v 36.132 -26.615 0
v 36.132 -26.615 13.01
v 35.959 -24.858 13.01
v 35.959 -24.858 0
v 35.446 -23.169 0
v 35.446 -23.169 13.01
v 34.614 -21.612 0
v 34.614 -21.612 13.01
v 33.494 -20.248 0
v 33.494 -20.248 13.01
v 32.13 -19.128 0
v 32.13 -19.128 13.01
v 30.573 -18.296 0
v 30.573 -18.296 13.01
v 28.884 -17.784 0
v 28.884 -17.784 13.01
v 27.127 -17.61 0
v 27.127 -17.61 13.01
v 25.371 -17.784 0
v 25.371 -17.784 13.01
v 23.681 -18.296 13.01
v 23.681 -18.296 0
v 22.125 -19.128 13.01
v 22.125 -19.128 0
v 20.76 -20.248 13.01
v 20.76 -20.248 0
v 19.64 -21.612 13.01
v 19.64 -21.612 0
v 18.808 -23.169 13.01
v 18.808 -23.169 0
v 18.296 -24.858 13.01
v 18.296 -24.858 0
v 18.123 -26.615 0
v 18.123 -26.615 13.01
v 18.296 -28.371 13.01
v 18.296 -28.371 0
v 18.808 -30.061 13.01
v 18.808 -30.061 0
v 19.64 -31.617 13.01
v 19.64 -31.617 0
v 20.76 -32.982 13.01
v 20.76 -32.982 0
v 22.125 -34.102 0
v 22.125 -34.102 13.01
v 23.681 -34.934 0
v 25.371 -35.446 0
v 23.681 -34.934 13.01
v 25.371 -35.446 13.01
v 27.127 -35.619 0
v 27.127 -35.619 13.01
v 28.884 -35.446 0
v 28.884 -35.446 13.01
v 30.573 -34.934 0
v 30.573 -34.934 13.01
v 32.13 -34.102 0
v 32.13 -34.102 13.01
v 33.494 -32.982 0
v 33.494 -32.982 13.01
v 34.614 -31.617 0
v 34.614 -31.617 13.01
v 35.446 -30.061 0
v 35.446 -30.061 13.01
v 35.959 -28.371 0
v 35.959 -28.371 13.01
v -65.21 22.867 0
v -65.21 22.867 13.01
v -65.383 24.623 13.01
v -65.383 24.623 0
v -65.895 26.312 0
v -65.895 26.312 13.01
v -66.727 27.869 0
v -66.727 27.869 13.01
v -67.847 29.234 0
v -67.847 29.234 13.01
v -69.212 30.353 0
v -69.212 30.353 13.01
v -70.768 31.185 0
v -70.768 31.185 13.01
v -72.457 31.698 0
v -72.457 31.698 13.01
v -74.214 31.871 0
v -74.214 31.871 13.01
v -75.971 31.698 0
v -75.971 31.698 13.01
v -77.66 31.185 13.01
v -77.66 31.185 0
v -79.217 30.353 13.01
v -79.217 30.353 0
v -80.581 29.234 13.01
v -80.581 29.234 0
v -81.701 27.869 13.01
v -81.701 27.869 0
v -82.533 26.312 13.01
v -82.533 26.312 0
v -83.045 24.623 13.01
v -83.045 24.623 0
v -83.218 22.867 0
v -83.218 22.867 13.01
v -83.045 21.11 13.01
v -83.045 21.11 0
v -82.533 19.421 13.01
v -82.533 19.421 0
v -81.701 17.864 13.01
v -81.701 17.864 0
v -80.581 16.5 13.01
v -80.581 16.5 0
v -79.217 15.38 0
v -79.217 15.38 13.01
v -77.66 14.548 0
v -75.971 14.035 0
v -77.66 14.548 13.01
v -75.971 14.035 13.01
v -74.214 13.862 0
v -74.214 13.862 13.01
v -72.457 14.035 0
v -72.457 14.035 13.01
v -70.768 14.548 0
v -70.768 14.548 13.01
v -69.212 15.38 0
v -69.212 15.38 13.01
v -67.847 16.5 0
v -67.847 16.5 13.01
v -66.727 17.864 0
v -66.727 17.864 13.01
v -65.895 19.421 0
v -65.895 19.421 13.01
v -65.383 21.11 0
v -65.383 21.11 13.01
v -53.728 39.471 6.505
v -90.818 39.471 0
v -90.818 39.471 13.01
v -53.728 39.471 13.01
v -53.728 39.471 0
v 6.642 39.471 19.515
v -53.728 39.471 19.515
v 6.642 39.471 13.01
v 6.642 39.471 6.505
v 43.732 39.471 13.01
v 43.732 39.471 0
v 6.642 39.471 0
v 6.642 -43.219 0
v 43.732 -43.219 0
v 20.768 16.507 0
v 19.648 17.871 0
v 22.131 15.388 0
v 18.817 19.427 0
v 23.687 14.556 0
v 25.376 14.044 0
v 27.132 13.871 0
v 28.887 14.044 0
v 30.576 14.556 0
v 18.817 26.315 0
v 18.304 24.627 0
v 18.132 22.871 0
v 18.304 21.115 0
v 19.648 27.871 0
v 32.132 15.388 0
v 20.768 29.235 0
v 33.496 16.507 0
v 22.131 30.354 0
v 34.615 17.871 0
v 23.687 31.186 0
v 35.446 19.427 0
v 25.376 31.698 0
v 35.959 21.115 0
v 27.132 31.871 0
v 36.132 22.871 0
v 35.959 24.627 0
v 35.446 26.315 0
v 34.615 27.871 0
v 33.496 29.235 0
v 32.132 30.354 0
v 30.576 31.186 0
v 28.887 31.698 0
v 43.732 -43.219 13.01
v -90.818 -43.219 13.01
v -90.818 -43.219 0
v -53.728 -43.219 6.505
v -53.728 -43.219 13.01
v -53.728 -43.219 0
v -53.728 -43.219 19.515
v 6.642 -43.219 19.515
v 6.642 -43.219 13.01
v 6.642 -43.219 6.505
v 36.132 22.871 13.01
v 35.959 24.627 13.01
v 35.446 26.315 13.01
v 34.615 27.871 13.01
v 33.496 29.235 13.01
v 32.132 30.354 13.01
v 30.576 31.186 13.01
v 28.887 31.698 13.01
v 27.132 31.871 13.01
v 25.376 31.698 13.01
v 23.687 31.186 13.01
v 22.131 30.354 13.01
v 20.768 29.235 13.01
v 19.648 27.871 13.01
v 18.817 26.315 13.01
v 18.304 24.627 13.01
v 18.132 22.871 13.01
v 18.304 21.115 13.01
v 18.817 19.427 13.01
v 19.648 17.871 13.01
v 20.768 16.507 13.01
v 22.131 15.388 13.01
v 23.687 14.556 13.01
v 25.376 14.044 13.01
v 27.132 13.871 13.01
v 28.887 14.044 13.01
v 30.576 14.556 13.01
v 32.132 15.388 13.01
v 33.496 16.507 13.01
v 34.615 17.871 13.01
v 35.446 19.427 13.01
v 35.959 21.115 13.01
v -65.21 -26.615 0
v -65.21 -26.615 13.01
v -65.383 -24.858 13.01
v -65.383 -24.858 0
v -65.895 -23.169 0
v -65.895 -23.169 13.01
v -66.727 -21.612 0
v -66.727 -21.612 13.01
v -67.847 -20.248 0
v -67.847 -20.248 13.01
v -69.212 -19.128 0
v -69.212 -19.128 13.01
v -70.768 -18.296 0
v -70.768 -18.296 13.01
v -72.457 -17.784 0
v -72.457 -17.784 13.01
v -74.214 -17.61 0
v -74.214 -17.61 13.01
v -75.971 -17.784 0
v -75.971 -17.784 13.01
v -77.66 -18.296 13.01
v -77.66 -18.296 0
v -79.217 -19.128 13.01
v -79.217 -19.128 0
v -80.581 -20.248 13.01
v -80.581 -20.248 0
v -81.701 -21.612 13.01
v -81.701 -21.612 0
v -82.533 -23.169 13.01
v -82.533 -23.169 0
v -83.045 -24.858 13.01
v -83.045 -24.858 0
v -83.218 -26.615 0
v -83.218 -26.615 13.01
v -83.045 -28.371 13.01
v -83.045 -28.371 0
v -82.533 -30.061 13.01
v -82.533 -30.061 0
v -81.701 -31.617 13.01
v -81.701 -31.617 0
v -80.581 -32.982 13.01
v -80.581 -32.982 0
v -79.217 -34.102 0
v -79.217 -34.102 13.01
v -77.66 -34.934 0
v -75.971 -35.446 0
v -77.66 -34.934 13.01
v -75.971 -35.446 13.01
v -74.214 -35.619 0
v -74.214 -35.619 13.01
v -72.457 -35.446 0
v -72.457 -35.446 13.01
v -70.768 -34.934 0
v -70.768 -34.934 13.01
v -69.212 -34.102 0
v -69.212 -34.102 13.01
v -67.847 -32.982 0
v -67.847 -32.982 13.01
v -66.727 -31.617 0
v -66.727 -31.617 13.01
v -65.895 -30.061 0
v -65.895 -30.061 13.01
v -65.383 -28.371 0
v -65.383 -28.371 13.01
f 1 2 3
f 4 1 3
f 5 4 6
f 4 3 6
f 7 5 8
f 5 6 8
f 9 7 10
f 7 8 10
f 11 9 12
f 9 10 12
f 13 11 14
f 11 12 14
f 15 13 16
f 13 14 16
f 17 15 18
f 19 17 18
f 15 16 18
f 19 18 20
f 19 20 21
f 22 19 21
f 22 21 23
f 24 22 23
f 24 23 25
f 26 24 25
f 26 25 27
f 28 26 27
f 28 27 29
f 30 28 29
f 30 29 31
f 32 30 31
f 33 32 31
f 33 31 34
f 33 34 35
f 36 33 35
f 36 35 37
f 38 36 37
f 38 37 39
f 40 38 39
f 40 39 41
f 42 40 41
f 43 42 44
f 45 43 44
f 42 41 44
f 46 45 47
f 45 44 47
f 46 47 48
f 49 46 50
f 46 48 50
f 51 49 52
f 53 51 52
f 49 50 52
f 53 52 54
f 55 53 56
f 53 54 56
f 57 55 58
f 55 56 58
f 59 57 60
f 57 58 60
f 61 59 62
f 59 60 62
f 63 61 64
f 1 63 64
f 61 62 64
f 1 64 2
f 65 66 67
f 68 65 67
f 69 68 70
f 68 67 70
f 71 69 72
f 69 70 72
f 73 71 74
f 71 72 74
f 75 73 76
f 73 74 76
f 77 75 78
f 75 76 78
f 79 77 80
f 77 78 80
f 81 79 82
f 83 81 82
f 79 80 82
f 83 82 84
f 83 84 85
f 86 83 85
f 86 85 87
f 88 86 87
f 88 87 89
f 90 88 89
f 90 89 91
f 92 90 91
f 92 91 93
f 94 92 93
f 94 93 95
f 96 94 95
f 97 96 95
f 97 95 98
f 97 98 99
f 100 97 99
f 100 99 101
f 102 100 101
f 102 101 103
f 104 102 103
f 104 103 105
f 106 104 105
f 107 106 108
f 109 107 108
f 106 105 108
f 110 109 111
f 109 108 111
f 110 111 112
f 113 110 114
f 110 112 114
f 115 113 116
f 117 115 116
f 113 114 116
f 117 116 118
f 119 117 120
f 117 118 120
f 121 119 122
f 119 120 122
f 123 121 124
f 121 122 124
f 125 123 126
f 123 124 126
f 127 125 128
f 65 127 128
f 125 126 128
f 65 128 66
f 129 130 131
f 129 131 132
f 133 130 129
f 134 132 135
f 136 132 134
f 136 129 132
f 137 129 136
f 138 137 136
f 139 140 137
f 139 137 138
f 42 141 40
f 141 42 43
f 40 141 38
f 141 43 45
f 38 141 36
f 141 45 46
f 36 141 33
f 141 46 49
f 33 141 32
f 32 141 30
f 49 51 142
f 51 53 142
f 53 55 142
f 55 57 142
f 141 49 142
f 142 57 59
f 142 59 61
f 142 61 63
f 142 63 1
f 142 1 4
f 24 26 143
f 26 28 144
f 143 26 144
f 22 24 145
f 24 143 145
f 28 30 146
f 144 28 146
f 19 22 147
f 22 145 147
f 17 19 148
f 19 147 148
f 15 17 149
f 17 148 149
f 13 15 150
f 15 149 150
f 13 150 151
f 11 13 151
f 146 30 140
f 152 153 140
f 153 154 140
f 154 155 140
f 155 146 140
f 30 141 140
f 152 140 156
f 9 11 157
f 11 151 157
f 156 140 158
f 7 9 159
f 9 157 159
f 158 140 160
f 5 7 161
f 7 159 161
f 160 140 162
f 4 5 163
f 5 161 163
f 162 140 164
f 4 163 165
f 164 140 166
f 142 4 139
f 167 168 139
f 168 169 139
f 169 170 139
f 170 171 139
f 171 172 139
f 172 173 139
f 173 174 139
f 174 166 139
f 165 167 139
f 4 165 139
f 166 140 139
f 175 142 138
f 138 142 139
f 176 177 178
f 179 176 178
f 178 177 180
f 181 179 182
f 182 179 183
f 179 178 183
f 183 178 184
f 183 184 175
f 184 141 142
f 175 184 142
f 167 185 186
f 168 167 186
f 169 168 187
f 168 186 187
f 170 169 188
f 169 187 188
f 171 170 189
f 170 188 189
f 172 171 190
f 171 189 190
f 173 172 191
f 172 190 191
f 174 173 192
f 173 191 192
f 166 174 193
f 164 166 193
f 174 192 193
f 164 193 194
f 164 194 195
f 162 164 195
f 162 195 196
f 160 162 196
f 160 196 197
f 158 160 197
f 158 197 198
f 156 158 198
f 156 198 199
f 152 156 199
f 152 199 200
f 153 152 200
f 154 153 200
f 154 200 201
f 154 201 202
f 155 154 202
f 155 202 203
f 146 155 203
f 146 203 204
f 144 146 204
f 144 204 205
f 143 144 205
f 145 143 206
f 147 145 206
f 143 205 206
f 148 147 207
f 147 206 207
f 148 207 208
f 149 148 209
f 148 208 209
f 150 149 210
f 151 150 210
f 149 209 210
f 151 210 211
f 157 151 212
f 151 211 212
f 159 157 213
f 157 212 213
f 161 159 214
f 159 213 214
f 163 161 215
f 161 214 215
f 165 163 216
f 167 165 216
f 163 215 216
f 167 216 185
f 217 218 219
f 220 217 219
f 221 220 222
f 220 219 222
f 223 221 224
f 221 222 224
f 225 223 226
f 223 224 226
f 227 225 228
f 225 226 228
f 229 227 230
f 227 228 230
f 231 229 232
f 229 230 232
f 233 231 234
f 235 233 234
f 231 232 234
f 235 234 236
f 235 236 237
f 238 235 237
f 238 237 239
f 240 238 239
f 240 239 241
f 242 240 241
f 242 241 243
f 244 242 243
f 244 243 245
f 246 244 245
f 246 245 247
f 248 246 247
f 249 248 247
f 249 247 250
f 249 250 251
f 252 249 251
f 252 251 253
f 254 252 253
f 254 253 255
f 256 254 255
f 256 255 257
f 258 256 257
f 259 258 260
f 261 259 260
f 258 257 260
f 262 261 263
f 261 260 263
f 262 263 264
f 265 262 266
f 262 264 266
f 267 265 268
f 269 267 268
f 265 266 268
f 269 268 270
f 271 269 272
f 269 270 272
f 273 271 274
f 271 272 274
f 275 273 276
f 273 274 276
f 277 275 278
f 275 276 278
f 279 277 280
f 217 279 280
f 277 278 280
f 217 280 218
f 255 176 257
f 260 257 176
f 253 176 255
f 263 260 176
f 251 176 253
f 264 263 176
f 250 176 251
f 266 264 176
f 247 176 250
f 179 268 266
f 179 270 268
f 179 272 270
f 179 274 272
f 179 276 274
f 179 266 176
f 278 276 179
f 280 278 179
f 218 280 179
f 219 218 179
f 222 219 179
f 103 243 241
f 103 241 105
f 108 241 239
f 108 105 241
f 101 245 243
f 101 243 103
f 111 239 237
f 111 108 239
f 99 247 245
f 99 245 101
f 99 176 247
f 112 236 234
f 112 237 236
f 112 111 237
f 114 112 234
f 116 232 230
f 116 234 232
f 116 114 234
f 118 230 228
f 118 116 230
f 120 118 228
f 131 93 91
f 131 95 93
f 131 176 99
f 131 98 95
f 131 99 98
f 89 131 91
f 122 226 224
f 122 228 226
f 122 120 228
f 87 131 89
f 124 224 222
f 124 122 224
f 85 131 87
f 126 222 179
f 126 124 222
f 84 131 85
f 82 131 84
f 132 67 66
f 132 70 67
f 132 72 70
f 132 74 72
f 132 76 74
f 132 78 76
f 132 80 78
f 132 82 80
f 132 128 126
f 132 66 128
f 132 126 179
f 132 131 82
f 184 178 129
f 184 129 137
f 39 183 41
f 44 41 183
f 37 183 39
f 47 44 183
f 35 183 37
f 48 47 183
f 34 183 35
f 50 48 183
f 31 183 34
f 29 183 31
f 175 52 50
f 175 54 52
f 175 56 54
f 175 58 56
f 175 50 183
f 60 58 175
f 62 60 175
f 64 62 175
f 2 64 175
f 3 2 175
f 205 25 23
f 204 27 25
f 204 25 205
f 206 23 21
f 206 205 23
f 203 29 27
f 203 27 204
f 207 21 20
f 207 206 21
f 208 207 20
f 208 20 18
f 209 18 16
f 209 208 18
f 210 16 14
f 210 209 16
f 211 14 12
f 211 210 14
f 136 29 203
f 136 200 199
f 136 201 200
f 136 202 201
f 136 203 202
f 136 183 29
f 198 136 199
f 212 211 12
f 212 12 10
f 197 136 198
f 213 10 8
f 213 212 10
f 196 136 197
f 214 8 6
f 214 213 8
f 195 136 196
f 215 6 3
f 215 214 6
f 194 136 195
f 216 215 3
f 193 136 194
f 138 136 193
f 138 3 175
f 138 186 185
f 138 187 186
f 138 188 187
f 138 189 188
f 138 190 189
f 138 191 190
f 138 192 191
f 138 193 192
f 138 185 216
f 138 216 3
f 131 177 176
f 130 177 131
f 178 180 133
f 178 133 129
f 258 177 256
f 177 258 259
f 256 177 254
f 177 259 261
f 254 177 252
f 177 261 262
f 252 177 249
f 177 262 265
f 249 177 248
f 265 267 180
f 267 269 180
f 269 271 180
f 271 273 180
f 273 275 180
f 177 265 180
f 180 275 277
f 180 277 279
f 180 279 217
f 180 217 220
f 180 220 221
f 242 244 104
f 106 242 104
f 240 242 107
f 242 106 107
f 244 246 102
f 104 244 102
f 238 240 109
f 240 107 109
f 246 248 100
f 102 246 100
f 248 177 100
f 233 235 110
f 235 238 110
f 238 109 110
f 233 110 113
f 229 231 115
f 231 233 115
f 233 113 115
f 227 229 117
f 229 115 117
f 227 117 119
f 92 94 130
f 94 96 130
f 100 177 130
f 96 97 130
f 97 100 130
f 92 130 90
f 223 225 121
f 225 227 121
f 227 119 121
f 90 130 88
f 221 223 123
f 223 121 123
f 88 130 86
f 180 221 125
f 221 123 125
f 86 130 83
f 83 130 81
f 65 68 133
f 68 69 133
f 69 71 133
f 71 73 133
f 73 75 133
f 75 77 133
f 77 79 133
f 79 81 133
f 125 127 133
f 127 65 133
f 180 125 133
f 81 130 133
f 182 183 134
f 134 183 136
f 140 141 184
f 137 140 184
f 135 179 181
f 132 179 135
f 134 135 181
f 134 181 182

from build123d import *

# Parameters (mm, degrees)
F0_W     = 134.55
F0_H     = 82.69
F1_DEPTH = 13.01
F2_W     = 60.370001
F2_H     = 6.50506
F3_DEPTH = 82.691
F4_W     = 60.370001
F4_H     = 82.69
F5_DEPTH = 6.50494
F6_R     = 8.999995
F6_R_2   = 9.0043
F7_DEPTH = 13.011


with BuildPart() as f1:
    # F0 (on Top) → F1 (new body)
    with BuildSketch(Plane.XY):
        with Locations((-23.54345, -1.874108)):
            Rectangle(F0_W, F0_H)
    extrude(amount=F1_DEPTH)

    # F2 (on face) → F3 (cut, through all)
    with BuildSketch(Plane.XZ.offset(43.219108)):
        with Locations((-23.54345, 3.25253)):
            Rectangle(F2_W, F2_H)
    extrude(amount=-F3_DEPTH, mode=Mode.SUBTRACT)

    # F4 (on face) → F5 (join)
    with BuildSketch(Plane.XY.offset(13.01)):
        with Locations((-23.54345, -1.874108)):
            Rectangle(F4_W, F4_H)
    extrude(amount=F5_DEPTH)

    # F6 (on face) → F7 (cut, through all)
    with BuildSketch(Plane.XY.offset(13.01)):
        with Locations((27.131545, 22.870887)):
            Circle(F6_R)
        with Locations((27.127239, -26.614798)):
            Circle(F6_R_2)
        with Locations((-74.21414, 22.866582)):
            Circle(F6_R_2)
        with Locations((-74.21414, -26.614798)):
            Circle(F6_R_2)
    extrude(amount=-F7_DEPTH, mode=Mode.SUBTRACT)


solid = f1.part
